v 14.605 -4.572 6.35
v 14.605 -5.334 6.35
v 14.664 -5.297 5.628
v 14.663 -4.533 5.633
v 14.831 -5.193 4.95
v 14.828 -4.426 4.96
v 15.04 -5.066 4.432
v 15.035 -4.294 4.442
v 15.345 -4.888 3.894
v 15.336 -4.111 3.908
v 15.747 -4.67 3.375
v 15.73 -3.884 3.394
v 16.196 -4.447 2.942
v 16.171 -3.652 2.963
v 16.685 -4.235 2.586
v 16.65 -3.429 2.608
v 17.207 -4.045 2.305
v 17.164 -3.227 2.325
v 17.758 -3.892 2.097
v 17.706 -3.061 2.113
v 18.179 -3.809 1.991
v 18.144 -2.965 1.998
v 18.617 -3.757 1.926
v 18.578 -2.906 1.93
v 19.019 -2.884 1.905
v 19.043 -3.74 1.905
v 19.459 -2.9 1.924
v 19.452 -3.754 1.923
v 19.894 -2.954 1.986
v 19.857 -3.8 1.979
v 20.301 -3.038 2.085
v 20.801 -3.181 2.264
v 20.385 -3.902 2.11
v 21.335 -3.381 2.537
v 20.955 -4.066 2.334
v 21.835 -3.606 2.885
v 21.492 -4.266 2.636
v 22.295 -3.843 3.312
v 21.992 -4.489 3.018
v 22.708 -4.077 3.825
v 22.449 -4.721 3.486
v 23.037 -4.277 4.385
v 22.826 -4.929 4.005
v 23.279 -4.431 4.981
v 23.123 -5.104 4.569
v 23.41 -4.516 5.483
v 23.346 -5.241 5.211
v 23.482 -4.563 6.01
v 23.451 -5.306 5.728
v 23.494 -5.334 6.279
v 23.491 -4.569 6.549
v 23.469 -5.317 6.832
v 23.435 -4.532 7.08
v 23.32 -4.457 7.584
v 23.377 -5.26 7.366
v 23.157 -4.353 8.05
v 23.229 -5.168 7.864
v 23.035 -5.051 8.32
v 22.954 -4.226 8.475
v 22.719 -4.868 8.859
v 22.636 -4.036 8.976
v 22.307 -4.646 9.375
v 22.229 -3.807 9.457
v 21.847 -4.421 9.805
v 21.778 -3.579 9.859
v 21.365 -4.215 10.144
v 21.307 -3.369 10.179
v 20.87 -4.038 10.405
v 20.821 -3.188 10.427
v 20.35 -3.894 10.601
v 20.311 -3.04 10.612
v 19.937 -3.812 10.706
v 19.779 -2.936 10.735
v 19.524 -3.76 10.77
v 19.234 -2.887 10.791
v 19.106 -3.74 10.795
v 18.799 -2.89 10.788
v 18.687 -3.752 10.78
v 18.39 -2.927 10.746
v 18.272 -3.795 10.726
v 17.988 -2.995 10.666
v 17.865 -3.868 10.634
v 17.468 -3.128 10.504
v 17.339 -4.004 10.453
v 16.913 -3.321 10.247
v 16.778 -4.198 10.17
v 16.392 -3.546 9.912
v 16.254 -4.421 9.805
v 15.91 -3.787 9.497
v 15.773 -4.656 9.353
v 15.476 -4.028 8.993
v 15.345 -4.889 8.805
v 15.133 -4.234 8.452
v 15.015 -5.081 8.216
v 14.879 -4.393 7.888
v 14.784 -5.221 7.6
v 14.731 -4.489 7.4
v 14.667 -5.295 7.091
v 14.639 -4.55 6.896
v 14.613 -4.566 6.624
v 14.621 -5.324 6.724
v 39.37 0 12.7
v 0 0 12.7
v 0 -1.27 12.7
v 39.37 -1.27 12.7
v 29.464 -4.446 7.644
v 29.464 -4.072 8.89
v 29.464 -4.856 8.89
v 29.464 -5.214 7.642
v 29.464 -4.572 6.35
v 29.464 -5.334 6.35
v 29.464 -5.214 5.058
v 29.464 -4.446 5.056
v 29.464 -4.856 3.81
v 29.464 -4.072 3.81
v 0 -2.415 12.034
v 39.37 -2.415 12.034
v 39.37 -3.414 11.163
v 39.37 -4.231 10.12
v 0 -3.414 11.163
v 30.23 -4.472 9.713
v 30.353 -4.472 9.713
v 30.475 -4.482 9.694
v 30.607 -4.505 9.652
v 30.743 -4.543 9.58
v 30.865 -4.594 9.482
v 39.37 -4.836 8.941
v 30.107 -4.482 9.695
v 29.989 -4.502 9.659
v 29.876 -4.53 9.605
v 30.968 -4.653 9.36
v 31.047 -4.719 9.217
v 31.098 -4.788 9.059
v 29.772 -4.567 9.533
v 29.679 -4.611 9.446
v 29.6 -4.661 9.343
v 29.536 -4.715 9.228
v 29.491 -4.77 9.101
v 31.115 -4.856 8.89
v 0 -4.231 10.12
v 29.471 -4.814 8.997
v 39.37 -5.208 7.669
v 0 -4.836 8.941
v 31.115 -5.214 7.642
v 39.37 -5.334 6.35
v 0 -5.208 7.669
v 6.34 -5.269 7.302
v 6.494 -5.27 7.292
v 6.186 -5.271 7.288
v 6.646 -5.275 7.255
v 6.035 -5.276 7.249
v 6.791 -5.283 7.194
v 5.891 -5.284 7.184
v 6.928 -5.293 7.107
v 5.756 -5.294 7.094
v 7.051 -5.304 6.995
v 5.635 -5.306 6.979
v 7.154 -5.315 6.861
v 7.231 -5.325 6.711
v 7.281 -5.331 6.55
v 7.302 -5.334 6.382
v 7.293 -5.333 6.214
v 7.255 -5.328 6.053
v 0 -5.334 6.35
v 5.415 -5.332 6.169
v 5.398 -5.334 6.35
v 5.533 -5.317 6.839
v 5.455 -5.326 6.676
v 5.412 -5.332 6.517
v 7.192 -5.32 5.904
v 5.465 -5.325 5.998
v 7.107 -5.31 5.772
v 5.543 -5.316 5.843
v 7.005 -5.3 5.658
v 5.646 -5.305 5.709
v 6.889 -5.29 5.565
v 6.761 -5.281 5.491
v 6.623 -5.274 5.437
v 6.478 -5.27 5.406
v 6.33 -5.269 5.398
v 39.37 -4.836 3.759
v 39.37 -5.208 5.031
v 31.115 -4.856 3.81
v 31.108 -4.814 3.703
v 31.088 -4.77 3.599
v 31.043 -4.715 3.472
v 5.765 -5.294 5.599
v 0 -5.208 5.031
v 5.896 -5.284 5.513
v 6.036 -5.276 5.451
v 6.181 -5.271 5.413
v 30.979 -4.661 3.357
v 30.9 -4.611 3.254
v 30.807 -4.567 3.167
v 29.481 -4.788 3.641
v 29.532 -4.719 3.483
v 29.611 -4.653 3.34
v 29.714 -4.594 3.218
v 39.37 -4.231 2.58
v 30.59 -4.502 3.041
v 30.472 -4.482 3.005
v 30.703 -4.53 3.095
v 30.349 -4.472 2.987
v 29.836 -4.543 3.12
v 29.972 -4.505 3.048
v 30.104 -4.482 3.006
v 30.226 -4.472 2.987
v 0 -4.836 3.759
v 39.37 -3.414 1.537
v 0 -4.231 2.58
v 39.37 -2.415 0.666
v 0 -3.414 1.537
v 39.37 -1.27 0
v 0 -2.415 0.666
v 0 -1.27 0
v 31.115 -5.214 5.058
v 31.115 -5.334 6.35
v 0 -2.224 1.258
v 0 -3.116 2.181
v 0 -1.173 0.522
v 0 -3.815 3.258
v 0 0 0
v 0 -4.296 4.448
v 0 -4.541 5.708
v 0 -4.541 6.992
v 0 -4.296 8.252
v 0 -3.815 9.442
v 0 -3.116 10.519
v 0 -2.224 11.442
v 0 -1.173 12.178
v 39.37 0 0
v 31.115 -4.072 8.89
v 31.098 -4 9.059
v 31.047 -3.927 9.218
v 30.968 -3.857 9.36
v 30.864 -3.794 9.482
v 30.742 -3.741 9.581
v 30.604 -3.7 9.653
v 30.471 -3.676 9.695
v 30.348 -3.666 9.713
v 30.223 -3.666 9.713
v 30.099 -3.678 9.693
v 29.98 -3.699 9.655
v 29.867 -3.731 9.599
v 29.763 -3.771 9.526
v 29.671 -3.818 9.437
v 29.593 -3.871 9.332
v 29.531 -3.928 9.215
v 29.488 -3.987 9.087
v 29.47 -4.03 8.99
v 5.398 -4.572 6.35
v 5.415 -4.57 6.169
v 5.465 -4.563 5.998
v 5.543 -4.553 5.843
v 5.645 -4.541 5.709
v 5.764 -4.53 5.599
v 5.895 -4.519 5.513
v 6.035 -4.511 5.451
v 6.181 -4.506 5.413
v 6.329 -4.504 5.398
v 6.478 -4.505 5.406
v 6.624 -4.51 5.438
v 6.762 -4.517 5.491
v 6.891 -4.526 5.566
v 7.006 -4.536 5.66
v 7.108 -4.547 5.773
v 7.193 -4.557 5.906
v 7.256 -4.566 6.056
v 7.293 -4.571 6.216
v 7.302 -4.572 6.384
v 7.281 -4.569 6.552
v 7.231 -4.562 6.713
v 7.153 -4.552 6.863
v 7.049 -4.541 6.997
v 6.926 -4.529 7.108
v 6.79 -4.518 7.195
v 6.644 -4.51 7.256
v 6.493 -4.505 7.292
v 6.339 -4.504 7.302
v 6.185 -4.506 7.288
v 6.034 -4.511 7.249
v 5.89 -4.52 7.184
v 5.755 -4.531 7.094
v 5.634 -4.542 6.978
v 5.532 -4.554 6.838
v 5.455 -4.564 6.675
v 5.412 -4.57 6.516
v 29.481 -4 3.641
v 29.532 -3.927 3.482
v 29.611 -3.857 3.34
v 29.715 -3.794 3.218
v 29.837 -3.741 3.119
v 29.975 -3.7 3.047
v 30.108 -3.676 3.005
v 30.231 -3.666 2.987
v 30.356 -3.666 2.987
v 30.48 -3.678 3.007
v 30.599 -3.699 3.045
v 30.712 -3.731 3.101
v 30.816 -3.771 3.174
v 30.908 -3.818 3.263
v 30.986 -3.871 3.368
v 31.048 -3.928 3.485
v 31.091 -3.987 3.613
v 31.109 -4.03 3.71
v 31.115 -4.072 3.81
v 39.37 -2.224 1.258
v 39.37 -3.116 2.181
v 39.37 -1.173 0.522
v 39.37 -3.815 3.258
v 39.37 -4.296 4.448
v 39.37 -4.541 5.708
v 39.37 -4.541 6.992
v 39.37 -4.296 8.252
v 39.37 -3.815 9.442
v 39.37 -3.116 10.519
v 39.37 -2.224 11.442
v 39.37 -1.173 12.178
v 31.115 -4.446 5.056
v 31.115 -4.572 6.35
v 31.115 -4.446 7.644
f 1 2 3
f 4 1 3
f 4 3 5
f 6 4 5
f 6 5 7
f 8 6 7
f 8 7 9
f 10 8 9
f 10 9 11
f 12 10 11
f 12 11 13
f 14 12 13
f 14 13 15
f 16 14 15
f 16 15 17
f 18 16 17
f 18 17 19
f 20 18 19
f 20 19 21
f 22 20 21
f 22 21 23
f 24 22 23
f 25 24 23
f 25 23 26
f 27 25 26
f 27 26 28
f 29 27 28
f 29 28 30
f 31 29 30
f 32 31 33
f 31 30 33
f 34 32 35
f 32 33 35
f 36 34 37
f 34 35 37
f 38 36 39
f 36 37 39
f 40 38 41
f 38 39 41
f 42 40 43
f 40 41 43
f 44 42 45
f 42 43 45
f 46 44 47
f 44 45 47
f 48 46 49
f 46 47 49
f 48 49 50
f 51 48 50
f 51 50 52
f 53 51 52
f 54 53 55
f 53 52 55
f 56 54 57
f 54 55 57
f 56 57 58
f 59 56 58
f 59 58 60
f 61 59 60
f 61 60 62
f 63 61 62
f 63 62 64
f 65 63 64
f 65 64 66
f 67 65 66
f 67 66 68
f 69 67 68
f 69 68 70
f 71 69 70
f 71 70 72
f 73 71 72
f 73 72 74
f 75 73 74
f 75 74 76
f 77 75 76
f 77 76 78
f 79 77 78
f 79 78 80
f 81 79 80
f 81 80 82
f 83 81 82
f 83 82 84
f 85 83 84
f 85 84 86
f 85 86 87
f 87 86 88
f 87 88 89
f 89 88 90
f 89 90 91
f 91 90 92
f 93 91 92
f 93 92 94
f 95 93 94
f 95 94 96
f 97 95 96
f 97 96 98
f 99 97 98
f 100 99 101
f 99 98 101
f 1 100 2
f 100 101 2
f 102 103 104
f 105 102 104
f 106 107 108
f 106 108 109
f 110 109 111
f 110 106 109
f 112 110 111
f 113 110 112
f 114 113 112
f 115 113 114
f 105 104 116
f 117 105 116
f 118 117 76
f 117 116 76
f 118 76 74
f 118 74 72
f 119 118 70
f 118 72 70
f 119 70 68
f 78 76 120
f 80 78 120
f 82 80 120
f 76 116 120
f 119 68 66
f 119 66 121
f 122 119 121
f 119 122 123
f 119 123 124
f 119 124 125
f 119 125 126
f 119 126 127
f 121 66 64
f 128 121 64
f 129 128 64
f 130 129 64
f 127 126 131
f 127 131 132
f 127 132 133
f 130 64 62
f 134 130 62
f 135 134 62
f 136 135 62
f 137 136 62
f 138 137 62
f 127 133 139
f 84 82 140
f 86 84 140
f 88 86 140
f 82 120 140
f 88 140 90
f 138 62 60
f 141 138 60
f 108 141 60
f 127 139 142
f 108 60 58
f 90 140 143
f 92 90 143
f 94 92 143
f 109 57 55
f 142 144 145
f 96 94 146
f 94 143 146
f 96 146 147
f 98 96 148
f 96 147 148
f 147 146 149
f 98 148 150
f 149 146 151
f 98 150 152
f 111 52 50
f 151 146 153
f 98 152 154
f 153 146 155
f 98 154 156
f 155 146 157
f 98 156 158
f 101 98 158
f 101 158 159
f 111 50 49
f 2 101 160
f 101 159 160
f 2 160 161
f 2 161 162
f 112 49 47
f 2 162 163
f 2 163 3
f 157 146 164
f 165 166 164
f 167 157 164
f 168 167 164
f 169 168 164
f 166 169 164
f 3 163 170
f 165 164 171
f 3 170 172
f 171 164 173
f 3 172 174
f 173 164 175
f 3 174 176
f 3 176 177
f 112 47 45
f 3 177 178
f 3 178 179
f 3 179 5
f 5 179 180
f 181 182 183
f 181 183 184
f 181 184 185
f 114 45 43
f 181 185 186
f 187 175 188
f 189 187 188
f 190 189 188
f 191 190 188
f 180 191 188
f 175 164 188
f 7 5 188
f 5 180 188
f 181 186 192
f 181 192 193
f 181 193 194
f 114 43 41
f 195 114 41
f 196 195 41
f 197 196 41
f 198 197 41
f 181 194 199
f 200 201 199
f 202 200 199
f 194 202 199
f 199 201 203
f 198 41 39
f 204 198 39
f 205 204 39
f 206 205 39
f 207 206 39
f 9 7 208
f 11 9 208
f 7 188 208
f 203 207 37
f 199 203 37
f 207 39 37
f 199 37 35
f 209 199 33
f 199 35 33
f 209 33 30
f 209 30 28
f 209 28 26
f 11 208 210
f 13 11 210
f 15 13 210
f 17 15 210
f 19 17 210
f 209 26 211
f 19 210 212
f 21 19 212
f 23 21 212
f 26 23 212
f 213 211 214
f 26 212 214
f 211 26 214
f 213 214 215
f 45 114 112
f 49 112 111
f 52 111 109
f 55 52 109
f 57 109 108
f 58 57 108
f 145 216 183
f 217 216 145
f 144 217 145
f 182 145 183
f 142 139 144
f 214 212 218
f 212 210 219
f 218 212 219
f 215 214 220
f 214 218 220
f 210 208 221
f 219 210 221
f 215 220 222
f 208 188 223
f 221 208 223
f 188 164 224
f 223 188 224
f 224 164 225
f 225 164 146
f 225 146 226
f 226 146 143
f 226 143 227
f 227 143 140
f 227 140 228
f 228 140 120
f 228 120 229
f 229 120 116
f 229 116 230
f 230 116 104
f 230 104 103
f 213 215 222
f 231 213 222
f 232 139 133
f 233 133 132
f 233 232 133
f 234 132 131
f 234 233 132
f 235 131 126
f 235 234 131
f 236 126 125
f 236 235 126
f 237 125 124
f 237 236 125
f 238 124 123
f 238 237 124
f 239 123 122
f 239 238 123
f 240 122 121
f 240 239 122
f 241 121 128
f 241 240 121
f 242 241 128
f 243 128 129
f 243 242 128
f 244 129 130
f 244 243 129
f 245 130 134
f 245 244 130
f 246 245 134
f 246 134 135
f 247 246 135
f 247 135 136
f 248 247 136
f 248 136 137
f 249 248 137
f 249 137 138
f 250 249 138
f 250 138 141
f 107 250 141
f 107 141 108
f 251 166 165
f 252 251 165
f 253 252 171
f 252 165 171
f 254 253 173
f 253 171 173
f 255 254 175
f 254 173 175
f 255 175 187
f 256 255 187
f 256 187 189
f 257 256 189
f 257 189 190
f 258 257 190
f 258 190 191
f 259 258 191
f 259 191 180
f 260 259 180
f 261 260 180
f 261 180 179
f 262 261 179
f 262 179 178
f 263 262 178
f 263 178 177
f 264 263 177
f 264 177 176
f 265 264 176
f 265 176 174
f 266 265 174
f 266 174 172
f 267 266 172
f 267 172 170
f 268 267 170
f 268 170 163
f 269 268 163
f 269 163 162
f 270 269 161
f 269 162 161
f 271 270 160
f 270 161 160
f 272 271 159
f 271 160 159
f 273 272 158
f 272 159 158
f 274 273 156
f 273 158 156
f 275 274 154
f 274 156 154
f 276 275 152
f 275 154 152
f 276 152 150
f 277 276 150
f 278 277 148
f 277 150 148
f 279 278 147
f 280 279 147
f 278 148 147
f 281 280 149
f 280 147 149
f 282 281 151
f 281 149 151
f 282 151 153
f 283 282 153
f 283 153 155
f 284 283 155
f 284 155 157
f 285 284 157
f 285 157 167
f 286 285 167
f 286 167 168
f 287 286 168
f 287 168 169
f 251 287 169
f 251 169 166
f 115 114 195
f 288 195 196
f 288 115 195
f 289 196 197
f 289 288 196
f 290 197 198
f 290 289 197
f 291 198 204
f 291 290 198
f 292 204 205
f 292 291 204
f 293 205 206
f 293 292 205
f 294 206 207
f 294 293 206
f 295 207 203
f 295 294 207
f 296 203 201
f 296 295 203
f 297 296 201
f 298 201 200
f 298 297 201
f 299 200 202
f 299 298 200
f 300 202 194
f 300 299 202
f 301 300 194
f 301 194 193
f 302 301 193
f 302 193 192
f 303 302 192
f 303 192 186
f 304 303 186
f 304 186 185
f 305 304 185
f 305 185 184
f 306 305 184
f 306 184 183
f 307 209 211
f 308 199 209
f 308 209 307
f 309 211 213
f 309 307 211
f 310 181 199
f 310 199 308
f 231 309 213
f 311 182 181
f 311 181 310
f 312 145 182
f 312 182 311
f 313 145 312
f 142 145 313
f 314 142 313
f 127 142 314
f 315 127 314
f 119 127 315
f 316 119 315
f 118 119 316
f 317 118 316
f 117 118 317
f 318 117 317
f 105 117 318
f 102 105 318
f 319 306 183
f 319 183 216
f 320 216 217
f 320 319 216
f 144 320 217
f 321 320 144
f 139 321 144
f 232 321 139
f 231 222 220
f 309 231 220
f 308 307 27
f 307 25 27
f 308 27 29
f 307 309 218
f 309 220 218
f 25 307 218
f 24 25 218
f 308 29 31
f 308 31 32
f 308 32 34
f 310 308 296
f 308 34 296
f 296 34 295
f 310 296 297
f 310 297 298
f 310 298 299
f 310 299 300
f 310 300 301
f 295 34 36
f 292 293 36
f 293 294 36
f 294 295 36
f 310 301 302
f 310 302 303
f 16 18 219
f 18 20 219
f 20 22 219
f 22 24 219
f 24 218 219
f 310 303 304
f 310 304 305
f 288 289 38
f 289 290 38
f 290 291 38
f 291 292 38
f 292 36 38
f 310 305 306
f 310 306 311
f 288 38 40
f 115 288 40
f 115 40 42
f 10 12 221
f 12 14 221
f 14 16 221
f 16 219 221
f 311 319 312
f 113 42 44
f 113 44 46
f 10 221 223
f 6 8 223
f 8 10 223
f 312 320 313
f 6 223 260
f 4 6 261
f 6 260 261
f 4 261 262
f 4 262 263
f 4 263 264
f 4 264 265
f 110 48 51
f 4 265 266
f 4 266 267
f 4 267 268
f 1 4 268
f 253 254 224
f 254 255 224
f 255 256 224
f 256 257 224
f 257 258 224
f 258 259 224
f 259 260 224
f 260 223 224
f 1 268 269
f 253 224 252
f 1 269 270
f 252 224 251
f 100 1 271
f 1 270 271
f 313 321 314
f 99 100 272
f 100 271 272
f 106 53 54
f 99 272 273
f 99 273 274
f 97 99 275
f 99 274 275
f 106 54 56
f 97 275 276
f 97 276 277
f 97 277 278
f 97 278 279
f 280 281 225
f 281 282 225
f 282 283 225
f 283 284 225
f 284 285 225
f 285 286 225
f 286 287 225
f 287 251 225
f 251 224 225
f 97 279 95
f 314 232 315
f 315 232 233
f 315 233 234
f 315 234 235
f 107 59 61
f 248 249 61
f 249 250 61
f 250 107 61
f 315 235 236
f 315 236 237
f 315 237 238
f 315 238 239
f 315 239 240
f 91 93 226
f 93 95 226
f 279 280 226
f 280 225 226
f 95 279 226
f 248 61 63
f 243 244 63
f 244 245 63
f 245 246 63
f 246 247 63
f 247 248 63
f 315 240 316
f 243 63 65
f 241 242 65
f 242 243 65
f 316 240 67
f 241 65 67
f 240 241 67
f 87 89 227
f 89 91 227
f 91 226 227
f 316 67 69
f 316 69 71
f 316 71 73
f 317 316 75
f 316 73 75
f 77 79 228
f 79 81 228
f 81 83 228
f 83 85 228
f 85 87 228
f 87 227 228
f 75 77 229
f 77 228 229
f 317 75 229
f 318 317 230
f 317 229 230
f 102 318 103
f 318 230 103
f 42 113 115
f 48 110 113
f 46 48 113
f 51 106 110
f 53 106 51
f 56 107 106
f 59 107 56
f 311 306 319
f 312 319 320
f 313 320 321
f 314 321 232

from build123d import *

# Parameters (mm, degrees)
F1_DEPTH = 39.37
F3_D     = 8.89
F5_D     = 1.905
F7_DEPTH = 16.002


with BuildPart() as f1:
    # F0 (on Right) → F1 (new body)
    with BuildSketch(Plane.YZ):
        with BuildLine():
            Line((-1.27, 0), (0, 0))
            ThreePointArc((0, 0), (-4.572, 6.35), (0, 12.7))
            Line((0, 12.7), (-1.27, 12.7))
            ThreePointArc((-1.27, 12.7), (-5.334, 6.35), (-1.27, 0))
        make_face()
    extrude(amount=F1_DEPTH)

    # F3 (through all)
    with Locations(Plane(origin=(0, 0, 0), x_dir=(1, 0, 0), z_dir=(0, 1, 0))):
        with Locations((19.05, -6.35)):
            Hole(F3_D / 2)

    # F5 (through all)
    with Locations(Plane(origin=(0, 0, 0), x_dir=(1, 0, 0), z_dir=(0, 1, 0))):
        with Locations((6.35, -6.35)):
            Hole(F5_D / 2)

    # F6 (on Front) → F7 (cut)
    with BuildSketch(Plane.XZ):
        with BuildLine():
            Line((29.464, 8.89), (29.464, 6.35))
            Line((29.464, 6.35), (29.464, 3.81))
            ThreePointArc((29.464, 3.81), (30.2895, 2.9845), (31.115, 3.81))
            Line((31.115, 3.81), (31.115, 6.35))
            Line((31.115, 6.35), (31.115, 8.89))
            ThreePointArc((31.115, 8.89), (30.2895, 9.7155), (29.464, 8.89))
        make_face()
    extrude(amount=F7_DEPTH, mode=Mode.SUBTRACT)


solid = f1.part
